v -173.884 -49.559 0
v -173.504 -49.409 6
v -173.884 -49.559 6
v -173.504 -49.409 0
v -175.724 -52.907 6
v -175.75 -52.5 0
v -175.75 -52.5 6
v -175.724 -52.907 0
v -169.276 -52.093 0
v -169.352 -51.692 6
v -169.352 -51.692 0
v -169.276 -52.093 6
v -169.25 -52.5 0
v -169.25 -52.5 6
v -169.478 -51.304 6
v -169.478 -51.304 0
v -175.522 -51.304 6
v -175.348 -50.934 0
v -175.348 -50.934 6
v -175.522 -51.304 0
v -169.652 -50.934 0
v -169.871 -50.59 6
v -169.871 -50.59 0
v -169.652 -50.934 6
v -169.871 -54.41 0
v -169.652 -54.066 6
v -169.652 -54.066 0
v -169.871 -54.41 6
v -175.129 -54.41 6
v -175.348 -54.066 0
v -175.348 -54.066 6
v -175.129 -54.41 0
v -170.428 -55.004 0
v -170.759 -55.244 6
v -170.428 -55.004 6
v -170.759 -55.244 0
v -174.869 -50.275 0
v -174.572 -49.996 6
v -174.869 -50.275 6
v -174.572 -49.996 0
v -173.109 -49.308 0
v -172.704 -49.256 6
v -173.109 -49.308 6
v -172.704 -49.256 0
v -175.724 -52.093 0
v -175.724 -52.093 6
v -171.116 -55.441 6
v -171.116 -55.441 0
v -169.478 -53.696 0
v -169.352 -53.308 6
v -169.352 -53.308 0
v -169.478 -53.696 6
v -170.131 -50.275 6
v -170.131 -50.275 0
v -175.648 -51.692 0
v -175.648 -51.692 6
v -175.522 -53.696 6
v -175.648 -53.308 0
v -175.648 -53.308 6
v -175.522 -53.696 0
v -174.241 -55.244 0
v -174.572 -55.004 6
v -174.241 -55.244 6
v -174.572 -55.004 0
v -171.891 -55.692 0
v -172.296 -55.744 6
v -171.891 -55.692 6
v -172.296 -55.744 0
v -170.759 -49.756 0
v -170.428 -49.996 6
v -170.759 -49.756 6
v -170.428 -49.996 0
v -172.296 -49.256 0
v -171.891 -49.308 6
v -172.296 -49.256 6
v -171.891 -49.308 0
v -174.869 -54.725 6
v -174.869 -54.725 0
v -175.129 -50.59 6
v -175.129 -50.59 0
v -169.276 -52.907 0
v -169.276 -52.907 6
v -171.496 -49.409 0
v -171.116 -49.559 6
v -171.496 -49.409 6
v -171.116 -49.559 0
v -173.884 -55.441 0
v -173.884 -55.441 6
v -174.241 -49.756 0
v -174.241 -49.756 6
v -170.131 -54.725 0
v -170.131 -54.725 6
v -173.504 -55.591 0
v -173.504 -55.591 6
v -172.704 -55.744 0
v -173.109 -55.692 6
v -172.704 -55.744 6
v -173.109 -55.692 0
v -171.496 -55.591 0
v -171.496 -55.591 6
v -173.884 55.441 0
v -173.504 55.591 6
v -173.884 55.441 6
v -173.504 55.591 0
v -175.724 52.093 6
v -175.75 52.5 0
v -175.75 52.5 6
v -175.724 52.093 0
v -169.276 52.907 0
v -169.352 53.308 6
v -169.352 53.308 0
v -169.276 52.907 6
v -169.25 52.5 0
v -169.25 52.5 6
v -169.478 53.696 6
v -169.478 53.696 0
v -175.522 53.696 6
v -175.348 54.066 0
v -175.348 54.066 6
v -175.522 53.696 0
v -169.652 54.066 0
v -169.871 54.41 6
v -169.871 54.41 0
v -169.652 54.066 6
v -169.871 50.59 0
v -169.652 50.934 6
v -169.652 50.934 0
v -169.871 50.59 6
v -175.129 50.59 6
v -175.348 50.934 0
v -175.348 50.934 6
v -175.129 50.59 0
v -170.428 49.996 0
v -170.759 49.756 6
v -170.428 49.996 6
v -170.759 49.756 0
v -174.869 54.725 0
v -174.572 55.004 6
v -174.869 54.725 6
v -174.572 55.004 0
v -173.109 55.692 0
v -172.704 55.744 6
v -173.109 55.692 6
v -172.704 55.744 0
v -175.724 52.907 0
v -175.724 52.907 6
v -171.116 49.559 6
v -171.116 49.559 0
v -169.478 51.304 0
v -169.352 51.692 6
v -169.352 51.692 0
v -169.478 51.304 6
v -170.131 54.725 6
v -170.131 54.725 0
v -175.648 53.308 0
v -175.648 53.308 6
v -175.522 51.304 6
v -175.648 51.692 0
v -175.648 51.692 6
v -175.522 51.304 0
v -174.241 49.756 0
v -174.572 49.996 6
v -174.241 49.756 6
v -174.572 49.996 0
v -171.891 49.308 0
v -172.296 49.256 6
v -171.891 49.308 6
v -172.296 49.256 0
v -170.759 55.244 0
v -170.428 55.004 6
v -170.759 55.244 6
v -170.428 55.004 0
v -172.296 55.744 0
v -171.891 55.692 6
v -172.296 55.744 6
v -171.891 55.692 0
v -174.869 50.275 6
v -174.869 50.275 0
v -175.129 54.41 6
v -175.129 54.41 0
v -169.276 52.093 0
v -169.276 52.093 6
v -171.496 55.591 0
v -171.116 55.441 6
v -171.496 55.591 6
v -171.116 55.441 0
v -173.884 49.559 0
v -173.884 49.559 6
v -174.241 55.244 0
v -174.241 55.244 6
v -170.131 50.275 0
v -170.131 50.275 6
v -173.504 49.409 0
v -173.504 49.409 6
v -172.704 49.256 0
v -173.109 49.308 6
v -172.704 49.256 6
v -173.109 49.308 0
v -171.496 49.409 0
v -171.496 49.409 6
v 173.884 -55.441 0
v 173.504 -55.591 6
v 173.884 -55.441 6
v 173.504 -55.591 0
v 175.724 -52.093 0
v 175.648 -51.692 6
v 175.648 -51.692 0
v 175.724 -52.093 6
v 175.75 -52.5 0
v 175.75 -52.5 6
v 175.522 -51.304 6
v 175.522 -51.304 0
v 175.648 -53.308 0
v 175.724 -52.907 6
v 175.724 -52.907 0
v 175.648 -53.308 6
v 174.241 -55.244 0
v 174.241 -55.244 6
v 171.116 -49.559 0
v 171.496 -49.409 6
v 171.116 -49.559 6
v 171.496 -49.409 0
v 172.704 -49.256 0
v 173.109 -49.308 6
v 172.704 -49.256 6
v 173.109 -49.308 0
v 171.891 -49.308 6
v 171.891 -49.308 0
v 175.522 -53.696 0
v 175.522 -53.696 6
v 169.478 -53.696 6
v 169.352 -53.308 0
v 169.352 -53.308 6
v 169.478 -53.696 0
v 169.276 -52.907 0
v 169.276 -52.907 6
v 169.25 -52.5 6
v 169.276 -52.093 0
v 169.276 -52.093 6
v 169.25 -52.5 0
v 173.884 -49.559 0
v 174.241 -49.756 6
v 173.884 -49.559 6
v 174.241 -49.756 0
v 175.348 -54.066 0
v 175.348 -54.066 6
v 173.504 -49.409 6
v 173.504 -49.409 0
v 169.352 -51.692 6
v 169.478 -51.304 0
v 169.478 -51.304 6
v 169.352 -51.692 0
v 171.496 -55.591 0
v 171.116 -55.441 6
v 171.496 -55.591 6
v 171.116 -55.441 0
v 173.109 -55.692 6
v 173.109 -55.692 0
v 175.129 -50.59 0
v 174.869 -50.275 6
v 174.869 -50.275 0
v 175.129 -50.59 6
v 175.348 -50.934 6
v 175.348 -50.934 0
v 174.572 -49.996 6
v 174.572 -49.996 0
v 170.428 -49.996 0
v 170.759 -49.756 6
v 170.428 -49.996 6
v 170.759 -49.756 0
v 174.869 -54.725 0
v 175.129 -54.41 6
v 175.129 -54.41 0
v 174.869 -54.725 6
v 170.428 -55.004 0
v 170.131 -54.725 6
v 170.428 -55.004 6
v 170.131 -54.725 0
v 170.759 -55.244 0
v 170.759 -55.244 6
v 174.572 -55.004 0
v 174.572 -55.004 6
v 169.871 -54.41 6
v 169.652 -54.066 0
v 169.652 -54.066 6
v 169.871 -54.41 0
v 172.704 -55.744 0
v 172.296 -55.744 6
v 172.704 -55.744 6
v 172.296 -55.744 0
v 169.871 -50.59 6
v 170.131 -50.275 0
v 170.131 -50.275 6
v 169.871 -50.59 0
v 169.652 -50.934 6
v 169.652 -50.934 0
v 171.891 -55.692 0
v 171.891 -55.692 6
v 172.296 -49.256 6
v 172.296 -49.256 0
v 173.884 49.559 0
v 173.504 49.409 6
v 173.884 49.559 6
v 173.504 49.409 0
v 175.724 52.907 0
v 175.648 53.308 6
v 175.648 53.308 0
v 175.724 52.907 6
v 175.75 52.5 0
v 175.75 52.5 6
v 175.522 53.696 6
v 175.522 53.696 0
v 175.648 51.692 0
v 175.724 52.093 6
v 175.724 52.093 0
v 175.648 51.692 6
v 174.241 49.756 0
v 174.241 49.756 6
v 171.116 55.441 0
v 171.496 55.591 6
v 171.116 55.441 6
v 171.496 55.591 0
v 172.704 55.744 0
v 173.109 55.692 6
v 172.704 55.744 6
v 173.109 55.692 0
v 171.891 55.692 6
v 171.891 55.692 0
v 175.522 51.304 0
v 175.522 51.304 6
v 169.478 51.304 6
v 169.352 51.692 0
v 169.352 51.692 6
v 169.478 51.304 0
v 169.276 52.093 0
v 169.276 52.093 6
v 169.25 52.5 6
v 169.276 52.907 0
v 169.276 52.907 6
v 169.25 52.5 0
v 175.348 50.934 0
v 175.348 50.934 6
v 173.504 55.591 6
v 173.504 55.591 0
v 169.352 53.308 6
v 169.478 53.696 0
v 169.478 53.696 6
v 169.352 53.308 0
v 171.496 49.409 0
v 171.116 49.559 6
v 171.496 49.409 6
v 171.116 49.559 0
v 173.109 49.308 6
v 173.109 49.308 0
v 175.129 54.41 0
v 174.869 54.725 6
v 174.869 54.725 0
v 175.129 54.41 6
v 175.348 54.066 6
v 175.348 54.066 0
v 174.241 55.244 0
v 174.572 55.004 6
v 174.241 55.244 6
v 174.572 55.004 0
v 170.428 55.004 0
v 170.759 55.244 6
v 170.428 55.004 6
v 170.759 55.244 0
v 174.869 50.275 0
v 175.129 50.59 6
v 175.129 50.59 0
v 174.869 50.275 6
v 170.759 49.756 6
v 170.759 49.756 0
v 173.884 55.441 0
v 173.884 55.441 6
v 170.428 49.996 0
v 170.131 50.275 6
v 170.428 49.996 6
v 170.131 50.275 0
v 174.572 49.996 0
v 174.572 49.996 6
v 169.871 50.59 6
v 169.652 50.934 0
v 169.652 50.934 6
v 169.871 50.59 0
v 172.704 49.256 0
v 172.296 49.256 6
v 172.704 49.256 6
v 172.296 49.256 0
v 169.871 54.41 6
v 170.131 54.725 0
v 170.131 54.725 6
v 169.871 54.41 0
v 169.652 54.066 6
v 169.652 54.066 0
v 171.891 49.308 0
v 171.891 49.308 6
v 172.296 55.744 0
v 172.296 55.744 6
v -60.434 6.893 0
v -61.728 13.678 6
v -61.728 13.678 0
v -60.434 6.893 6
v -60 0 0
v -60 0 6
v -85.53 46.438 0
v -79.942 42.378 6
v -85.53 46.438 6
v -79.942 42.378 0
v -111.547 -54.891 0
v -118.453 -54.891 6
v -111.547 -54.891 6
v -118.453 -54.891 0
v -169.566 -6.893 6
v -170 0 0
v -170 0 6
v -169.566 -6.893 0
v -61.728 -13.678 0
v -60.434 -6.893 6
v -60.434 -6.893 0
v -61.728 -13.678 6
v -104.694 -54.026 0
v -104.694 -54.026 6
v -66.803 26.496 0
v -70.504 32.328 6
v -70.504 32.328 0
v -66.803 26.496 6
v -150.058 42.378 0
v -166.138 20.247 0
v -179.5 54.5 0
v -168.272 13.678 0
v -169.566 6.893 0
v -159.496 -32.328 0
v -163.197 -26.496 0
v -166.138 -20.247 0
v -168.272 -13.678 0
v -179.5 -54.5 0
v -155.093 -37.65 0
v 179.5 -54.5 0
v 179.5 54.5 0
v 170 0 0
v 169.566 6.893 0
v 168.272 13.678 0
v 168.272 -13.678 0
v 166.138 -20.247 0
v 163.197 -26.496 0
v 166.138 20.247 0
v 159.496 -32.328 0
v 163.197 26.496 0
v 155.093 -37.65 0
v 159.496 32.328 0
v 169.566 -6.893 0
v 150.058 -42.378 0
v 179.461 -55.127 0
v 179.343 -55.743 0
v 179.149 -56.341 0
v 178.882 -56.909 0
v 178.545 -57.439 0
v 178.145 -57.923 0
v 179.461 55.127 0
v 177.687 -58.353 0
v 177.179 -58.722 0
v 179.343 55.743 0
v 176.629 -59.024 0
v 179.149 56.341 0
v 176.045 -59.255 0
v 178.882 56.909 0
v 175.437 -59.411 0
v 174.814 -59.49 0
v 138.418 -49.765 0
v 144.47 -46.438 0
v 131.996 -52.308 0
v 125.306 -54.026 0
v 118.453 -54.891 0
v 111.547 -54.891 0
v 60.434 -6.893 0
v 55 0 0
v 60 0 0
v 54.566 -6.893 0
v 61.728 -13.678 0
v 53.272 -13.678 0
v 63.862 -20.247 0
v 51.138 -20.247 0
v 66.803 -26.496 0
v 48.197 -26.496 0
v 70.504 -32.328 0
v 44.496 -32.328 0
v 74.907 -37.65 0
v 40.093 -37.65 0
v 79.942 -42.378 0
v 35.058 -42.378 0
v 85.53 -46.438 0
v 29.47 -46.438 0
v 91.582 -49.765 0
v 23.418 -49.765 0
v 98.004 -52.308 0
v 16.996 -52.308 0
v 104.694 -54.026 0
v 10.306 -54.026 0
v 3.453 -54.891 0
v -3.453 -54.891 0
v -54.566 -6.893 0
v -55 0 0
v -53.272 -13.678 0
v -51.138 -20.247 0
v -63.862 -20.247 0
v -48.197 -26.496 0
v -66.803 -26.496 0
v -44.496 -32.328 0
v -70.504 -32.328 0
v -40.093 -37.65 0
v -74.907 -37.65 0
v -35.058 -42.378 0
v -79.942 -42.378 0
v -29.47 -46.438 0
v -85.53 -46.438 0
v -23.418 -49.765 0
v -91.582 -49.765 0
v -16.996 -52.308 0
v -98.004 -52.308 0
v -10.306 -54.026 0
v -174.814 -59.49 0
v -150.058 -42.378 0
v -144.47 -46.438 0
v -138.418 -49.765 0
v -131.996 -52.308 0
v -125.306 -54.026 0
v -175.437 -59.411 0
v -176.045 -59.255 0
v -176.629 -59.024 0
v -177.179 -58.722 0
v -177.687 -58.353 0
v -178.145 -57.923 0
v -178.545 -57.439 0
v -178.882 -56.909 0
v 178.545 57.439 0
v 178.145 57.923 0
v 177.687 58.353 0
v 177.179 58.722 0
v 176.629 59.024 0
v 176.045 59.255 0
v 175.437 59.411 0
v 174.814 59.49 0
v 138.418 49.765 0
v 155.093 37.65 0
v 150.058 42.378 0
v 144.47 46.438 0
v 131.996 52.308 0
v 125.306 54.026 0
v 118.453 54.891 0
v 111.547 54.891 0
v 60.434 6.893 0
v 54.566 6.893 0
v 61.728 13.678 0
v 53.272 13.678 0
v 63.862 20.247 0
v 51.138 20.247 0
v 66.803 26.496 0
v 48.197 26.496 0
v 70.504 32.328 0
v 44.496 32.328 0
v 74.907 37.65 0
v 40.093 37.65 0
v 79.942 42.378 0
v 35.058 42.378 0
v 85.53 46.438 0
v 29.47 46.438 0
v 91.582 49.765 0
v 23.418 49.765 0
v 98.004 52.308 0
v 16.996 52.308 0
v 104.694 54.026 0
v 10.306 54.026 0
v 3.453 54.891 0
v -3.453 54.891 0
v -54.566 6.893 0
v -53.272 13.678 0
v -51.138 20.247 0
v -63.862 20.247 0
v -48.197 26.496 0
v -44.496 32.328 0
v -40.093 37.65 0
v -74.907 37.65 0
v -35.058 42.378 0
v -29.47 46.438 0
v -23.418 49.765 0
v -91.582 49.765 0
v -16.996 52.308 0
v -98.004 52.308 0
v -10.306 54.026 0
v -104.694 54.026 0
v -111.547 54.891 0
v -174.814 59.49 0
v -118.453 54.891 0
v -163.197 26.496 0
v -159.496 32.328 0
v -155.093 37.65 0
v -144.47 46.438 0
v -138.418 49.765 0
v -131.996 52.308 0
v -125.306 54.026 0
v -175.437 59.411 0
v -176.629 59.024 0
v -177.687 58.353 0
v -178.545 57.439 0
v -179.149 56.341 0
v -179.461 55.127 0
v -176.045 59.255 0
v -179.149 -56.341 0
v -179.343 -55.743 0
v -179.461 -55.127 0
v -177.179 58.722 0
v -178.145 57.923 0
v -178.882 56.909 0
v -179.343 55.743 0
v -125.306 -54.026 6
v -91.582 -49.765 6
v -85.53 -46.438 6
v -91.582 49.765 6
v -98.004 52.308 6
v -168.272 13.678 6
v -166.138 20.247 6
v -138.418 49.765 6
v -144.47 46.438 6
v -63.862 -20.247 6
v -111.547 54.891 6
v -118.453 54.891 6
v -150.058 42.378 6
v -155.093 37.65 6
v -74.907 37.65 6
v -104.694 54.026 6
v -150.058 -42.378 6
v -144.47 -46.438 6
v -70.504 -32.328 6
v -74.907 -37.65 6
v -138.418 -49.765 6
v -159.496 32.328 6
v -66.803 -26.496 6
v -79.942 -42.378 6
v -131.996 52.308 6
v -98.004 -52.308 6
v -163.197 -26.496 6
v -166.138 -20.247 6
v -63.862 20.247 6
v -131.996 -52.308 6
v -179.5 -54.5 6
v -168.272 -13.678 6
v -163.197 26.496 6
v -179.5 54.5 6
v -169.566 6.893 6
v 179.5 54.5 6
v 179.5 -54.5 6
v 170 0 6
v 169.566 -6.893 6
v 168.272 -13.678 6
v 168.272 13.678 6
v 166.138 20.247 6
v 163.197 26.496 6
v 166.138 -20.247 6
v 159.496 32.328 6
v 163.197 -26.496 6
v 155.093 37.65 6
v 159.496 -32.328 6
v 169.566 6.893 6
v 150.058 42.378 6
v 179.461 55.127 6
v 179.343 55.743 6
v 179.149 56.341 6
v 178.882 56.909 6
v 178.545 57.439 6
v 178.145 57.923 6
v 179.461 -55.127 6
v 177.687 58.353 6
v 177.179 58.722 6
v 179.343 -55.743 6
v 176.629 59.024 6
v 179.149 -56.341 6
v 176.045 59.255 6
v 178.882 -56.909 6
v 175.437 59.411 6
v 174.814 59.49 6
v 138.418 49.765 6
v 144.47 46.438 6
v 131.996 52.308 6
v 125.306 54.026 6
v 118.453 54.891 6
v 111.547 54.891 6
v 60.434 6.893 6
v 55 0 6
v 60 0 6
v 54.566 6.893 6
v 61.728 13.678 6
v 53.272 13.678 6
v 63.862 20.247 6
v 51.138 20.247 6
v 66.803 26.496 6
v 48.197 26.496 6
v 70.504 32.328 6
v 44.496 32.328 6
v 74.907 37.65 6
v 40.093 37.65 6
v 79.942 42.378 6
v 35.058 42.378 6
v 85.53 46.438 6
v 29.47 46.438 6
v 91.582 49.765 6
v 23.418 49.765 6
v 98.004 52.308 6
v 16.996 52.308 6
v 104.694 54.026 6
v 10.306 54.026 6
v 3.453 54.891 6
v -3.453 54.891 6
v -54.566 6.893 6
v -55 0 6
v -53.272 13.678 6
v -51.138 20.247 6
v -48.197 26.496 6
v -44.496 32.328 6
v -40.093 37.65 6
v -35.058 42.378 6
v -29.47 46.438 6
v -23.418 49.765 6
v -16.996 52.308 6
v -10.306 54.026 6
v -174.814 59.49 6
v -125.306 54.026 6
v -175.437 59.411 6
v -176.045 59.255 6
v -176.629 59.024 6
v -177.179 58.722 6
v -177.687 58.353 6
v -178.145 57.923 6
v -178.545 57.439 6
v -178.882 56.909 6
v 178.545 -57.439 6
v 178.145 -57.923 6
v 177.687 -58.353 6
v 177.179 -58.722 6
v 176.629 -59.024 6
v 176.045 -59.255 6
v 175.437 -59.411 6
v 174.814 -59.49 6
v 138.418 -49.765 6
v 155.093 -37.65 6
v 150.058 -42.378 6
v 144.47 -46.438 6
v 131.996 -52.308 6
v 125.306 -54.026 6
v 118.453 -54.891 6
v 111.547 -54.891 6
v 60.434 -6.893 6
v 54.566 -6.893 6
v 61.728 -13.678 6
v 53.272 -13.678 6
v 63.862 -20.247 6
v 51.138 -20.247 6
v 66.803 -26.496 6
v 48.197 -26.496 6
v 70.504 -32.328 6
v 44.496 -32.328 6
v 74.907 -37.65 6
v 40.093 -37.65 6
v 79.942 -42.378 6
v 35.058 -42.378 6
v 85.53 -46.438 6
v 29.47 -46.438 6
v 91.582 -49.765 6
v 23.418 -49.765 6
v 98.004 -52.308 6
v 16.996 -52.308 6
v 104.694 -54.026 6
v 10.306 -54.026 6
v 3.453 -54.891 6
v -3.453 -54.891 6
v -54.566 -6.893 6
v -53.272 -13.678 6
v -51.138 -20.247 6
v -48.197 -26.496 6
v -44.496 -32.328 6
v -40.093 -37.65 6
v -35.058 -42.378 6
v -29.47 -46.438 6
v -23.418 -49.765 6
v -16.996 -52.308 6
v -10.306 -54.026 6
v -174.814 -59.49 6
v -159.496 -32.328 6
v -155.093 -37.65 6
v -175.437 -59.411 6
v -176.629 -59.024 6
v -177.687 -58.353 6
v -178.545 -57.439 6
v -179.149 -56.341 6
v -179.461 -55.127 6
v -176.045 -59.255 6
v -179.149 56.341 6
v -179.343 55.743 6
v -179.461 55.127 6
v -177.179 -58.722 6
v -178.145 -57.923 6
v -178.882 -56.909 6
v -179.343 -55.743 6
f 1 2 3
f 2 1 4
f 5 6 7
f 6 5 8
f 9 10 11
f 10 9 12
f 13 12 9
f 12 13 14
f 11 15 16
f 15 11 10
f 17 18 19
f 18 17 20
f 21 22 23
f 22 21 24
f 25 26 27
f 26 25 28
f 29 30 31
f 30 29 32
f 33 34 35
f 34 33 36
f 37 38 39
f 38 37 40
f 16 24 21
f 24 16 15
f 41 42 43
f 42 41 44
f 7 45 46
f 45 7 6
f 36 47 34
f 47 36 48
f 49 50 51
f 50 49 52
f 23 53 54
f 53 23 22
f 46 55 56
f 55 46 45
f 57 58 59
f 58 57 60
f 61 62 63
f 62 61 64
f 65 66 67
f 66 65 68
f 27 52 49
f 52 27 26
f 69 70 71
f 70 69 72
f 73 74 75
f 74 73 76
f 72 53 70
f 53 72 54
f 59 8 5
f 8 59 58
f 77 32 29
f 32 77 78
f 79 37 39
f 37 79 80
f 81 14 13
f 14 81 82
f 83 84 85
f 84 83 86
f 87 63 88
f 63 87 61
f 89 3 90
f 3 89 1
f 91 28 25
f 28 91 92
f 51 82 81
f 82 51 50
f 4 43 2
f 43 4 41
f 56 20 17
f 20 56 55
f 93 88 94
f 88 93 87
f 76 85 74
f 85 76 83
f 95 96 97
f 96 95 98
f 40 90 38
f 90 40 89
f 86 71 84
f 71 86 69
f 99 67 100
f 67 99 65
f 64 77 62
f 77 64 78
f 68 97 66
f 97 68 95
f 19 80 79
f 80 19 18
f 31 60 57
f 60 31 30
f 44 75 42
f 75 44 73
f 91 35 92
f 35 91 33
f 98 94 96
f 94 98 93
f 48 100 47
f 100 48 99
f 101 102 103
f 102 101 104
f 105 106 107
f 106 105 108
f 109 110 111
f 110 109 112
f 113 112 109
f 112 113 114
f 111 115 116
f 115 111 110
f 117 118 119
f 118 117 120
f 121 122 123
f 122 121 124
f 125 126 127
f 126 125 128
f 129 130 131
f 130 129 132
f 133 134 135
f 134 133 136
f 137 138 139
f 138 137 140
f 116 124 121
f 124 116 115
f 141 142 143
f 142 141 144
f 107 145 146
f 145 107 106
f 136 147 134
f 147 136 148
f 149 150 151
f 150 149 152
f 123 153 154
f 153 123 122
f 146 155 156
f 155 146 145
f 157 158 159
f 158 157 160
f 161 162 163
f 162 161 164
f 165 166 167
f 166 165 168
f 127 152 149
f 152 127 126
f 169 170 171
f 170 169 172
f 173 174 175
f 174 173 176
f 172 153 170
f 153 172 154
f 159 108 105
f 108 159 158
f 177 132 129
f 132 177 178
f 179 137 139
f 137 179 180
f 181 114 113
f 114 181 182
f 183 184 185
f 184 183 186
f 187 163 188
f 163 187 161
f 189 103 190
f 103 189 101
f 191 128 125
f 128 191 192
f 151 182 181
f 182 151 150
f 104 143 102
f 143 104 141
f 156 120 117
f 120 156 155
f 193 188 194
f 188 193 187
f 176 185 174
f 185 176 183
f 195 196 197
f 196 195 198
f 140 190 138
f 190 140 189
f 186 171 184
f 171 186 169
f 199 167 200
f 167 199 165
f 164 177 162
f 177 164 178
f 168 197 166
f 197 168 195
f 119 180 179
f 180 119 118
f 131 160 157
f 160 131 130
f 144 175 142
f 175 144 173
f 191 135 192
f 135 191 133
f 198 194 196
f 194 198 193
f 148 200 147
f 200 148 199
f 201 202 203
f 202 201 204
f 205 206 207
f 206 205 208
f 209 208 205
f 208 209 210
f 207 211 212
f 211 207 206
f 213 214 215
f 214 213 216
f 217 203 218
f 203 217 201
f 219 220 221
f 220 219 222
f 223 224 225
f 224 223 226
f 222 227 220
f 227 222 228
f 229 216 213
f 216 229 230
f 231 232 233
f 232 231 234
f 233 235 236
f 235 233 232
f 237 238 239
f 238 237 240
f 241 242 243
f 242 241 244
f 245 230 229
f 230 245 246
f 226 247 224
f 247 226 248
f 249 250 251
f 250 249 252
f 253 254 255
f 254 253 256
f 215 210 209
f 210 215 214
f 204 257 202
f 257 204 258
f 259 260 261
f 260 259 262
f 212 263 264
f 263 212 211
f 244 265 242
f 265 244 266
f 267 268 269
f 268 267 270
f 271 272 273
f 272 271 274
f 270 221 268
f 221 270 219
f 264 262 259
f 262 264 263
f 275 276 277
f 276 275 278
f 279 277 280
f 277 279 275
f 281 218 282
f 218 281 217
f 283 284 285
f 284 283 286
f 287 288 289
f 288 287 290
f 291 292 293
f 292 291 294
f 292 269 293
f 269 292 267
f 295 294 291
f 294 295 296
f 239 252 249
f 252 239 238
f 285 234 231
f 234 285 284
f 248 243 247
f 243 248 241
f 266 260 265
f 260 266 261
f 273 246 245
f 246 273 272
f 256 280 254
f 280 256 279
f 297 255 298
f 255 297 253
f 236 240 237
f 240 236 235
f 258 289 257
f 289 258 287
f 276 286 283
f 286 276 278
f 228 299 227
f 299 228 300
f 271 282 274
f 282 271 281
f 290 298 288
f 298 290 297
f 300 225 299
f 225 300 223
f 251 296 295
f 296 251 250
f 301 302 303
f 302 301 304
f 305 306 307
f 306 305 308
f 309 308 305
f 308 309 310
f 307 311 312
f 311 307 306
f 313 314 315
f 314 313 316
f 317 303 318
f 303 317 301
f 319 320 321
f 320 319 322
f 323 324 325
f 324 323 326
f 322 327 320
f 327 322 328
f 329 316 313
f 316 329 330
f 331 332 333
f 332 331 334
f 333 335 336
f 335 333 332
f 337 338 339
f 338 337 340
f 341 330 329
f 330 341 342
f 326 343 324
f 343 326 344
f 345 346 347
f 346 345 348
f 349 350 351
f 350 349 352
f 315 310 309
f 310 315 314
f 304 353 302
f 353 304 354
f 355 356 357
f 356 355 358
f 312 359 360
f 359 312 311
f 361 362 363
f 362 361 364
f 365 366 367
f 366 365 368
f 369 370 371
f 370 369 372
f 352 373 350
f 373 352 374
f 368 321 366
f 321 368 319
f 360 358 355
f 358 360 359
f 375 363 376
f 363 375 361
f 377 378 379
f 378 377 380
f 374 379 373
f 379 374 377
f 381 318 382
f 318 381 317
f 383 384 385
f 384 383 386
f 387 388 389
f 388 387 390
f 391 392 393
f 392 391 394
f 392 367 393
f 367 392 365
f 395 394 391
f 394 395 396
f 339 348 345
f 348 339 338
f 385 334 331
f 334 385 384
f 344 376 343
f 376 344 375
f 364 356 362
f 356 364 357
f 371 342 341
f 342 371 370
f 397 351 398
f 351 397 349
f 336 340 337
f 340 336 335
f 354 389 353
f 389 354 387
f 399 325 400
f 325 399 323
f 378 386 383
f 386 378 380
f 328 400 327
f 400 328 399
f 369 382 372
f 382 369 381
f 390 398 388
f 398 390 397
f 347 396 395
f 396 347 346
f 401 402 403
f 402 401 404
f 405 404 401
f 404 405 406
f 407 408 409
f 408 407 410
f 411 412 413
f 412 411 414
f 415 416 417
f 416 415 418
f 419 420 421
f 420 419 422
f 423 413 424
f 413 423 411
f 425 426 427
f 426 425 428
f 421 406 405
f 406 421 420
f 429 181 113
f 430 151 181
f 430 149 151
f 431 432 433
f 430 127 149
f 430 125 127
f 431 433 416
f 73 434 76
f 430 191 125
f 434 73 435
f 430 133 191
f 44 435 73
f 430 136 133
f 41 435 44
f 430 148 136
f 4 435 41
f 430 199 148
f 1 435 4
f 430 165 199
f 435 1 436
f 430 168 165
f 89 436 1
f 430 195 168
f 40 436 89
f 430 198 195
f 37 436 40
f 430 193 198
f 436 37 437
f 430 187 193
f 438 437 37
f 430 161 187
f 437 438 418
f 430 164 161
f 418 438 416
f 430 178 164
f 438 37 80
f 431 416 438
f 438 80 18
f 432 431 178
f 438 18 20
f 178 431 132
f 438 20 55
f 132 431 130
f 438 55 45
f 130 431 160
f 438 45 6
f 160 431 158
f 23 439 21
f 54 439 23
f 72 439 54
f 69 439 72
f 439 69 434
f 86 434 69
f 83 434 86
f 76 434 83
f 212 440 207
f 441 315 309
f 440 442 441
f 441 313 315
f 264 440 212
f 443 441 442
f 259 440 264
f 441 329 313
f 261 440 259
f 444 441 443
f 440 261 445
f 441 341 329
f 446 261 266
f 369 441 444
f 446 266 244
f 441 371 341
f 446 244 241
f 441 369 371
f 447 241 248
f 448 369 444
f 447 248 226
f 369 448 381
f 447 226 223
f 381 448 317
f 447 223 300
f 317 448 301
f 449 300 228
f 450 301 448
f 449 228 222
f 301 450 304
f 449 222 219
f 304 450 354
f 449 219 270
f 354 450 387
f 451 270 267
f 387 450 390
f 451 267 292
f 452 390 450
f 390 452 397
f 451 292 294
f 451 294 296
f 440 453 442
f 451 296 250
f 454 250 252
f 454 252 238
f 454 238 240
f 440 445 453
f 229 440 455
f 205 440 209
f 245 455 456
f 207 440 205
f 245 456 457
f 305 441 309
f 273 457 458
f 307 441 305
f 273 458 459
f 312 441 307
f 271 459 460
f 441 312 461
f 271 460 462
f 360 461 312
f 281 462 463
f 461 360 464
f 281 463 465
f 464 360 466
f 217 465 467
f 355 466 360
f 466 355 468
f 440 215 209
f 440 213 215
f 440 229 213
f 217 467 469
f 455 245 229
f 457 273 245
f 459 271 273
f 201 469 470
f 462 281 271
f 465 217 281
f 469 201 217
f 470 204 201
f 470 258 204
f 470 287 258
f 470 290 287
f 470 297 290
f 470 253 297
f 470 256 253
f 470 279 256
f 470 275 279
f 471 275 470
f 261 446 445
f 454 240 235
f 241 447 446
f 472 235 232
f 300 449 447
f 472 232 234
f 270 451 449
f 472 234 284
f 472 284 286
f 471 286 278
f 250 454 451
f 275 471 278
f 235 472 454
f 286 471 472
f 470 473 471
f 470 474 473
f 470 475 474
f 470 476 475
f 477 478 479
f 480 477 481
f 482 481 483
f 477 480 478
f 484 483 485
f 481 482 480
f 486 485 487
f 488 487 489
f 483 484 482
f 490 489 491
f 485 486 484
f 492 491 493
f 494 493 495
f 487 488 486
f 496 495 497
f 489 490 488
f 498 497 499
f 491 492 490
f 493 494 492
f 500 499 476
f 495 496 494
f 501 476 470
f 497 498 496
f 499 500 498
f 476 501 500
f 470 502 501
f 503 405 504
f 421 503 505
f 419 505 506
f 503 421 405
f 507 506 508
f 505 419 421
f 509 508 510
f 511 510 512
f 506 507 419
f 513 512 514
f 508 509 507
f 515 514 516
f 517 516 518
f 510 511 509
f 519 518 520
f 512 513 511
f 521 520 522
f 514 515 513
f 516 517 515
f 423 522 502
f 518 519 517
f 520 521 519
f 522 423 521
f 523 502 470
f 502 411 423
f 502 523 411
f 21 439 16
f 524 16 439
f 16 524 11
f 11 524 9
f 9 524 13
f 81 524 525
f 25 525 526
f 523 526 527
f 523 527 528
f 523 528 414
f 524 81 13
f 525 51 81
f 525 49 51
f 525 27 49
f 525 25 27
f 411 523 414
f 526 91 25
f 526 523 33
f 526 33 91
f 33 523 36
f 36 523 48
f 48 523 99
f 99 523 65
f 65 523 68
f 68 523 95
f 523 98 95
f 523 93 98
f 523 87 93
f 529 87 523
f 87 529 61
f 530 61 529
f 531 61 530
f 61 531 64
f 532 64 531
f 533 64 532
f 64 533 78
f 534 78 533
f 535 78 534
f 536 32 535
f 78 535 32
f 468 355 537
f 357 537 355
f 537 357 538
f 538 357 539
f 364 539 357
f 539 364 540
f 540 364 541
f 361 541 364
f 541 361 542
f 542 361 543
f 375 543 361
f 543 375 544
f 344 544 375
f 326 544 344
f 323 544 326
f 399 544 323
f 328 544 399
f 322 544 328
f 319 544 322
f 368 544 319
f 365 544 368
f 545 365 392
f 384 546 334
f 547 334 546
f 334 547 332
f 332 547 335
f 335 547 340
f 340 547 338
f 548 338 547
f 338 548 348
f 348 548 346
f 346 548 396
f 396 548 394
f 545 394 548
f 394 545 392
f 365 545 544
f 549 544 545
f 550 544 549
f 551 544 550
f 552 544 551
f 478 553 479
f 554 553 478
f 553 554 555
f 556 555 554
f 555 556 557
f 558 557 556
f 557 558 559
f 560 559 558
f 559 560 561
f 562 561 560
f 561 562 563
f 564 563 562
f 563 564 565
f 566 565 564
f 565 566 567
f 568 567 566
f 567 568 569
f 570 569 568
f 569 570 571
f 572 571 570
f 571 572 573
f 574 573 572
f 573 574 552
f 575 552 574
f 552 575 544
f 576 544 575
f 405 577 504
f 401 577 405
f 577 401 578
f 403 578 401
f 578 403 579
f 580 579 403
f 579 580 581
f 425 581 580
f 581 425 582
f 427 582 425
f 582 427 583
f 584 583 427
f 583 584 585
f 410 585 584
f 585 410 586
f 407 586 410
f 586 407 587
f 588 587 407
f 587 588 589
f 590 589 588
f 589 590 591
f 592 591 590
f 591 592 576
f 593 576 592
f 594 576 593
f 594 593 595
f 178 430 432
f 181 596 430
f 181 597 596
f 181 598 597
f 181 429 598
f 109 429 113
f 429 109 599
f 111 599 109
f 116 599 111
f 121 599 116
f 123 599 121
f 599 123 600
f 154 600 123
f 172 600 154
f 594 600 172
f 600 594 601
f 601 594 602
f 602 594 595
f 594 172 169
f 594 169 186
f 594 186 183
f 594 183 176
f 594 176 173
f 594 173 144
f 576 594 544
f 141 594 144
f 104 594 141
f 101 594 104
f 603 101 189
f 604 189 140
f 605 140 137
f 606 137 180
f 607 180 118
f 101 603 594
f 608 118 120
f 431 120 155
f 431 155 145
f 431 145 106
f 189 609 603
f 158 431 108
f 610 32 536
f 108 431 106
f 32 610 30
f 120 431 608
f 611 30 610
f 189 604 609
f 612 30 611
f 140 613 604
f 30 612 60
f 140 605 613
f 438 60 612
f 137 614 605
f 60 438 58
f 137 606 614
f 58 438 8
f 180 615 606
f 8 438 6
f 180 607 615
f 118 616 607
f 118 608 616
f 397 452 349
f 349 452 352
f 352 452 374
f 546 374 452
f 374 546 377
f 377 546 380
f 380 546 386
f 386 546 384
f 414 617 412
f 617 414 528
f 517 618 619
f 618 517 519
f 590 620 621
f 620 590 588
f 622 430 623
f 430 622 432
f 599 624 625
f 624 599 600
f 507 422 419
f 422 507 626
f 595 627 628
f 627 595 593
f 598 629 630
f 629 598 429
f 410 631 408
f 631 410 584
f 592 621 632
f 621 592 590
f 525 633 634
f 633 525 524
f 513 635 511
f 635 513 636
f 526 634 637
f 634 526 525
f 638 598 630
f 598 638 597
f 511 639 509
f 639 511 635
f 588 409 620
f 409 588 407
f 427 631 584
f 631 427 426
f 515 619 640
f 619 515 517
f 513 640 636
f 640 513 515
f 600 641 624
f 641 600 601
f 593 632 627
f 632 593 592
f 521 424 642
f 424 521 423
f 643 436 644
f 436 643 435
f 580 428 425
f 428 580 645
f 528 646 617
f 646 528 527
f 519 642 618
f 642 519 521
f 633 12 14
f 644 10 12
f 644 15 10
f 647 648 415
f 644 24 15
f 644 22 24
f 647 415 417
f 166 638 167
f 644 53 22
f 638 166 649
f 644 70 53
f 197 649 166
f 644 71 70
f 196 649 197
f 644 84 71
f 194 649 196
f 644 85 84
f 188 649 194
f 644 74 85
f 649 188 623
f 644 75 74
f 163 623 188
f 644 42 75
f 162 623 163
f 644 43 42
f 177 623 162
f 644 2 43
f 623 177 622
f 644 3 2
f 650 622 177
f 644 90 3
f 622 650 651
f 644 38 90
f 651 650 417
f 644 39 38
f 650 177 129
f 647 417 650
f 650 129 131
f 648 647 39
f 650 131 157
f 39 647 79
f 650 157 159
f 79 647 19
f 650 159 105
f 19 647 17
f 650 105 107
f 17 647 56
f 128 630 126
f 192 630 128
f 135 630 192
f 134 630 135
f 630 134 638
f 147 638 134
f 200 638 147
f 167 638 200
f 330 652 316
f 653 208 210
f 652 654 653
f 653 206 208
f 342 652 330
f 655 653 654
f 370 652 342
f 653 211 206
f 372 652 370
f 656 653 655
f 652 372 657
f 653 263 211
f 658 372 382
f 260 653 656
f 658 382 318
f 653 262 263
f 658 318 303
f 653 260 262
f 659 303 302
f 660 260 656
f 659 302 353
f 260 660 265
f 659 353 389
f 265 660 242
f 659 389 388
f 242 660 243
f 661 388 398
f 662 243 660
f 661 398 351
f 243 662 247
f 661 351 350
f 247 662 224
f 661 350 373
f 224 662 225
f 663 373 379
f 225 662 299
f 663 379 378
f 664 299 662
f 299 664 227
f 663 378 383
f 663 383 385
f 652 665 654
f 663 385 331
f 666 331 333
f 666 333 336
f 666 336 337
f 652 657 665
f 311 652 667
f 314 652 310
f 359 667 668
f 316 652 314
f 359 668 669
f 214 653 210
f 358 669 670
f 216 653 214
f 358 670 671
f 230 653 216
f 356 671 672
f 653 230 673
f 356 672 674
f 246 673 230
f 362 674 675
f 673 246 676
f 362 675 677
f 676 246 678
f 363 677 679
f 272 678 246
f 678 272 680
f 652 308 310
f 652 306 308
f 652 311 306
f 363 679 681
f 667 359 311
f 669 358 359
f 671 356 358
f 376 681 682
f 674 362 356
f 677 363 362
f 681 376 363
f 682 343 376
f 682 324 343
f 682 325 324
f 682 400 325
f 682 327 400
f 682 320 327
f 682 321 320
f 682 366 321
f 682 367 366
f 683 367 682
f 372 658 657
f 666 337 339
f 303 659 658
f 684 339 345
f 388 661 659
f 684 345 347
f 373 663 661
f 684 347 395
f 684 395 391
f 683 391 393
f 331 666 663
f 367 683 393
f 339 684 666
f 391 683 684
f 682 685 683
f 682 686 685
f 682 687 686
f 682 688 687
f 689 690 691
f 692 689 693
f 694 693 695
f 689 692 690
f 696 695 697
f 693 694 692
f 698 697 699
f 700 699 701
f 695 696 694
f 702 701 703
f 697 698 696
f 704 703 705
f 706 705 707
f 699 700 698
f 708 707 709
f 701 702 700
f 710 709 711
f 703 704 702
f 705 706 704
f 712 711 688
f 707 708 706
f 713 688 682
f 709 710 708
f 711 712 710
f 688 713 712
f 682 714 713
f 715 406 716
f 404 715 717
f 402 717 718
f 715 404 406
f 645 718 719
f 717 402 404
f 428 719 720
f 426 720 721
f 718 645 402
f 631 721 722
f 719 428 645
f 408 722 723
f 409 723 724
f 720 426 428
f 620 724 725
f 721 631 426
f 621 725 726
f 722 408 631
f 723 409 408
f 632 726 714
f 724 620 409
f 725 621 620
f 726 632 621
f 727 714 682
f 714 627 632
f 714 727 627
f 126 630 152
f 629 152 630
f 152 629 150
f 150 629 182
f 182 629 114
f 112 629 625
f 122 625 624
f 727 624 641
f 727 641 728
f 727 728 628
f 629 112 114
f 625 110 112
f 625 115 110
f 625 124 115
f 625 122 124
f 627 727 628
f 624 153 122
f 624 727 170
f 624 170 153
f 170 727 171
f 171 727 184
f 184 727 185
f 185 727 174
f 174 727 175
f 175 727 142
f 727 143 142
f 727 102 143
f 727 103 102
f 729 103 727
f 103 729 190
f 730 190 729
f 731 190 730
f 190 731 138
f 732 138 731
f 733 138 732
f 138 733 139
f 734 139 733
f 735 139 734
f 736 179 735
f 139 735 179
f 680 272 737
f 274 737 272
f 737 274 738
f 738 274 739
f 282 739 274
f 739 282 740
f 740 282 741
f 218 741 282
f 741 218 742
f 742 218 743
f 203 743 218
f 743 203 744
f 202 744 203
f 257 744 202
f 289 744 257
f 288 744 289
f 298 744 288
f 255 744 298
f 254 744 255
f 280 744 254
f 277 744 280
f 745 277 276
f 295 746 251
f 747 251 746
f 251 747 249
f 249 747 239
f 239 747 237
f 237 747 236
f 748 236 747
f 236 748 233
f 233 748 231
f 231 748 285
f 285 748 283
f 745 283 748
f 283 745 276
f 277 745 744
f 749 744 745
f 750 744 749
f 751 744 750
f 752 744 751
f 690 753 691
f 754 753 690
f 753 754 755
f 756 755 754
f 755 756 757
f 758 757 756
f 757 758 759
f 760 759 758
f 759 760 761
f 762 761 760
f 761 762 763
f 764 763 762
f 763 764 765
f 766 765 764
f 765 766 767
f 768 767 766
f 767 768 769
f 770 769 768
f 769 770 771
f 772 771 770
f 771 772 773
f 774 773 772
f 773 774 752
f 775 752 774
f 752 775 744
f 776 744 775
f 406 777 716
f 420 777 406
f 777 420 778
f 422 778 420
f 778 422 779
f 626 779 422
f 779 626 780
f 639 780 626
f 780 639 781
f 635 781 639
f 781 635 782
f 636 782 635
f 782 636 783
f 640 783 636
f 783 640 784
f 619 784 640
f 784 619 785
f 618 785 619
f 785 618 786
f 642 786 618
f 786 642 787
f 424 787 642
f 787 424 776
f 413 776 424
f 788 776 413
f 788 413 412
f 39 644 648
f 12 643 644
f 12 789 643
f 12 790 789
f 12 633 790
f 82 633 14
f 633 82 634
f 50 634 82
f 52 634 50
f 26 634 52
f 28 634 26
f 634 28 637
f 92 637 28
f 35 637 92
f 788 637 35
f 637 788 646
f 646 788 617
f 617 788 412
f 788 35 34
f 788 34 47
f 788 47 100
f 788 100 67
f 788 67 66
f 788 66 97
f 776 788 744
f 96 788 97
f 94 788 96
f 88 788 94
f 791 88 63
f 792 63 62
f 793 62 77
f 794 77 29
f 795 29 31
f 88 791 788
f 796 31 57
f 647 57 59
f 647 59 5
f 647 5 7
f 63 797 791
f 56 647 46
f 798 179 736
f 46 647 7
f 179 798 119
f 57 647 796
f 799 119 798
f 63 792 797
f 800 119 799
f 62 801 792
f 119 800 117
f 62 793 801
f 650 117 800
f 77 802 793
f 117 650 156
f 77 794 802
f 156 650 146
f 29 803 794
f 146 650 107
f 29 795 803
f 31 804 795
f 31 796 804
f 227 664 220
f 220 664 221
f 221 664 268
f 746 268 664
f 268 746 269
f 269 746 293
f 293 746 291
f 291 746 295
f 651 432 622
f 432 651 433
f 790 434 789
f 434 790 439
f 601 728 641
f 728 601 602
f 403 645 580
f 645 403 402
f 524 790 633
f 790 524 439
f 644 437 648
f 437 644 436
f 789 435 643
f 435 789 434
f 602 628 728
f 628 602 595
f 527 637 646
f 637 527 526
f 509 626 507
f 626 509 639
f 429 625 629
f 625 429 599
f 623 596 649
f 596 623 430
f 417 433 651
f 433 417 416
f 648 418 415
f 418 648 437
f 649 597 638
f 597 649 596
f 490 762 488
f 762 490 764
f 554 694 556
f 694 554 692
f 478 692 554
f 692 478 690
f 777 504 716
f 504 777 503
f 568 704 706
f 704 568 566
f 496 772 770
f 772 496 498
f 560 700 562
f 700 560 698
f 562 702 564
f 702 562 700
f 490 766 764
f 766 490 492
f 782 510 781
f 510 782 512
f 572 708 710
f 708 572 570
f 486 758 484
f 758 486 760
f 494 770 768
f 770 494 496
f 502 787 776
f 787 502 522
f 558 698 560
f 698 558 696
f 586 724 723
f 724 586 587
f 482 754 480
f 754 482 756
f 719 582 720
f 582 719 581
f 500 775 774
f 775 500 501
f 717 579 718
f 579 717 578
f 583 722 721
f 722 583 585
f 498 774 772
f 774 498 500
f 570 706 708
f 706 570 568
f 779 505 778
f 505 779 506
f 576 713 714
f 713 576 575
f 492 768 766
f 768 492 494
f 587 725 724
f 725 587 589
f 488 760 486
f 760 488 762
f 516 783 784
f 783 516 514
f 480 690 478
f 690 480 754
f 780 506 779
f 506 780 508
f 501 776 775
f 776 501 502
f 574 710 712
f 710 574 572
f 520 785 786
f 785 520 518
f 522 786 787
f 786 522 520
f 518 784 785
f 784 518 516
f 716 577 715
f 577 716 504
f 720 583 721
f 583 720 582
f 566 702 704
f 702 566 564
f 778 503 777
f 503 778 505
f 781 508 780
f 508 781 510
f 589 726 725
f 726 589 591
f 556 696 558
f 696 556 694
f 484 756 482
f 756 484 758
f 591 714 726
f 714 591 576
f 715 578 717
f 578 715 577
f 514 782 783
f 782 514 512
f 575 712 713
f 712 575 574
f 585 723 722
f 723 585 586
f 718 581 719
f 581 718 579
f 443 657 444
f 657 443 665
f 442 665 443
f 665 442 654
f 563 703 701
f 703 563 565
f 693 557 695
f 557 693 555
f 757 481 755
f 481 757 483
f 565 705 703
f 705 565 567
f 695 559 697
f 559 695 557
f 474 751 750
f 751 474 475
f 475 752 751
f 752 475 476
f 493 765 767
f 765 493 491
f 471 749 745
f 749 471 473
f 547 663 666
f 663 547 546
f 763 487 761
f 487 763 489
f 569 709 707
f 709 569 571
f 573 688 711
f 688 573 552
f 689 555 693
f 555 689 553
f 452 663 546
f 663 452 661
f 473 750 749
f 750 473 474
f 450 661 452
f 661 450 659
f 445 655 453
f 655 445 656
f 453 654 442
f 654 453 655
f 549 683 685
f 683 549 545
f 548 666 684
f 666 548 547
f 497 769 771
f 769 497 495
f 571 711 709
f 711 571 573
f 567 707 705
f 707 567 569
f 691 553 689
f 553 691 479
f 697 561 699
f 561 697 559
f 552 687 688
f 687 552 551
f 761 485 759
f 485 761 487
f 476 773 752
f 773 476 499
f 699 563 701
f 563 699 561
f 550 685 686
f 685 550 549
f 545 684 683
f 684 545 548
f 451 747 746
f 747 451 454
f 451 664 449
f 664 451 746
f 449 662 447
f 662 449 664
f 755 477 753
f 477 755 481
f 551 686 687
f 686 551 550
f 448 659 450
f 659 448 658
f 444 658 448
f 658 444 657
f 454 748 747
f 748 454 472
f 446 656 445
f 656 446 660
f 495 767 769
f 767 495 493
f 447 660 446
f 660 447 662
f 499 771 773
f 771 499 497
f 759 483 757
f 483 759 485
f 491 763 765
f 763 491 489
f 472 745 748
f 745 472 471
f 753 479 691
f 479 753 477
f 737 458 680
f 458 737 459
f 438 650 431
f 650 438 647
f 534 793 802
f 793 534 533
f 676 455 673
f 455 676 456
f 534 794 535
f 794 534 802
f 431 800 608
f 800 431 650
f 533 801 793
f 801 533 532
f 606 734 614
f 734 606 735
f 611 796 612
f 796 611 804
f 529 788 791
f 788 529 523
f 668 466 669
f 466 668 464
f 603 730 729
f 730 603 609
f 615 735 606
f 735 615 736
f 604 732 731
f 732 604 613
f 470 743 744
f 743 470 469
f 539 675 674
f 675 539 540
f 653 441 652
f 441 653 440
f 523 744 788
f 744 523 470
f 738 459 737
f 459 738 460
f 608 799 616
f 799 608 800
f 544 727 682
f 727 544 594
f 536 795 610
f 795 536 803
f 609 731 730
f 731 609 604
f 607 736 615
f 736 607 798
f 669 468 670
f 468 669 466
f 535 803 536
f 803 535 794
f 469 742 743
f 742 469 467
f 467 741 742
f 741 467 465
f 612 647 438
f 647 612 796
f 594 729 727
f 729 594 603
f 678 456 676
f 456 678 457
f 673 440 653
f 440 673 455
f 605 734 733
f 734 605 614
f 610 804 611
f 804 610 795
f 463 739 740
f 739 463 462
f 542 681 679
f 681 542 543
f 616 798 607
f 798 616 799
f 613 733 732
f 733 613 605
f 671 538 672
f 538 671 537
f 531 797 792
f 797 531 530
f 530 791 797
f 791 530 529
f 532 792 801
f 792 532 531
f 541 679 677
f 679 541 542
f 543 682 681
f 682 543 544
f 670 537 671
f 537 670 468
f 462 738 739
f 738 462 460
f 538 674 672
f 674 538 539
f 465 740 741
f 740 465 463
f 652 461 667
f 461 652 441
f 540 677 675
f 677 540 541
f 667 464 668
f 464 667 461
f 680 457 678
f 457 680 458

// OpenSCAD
$fn = 50;


difference() {
	union() {
		hull() {
			translate(v = [-174.5000000000, 54.5000000000, 0]) {
				cylinder(h = 6, r = 5);
			}
			translate(v = [174.5000000000, 54.5000000000, 0]) {
				cylinder(h = 6, r = 5);
			}
			translate(v = [-174.5000000000, -54.5000000000, 0]) {
				cylinder(h = 6, r = 5);
			}
			translate(v = [174.5000000000, -54.5000000000, 0]) {
				cylinder(h = 6, r = 5);
			}
		}
	}
	union() {
		#translate(v = [-172.5000000000, -52.5000000000, -100.0000000000]) {
			cylinder(h = 200, r = 3.2500000000);
		}
		#translate(v = [-172.5000000000, 52.5000000000, -100.0000000000]) {
			cylinder(h = 200, r = 3.2500000000);
		}
		#translate(v = [172.5000000000, -52.5000000000, -100.0000000000]) {
			cylinder(h = 200, r = 3.2500000000);
		}
		#translate(v = [172.5000000000, 52.5000000000, -100.0000000000]) {
			cylinder(h = 200, r = 3.2500000000);
		}
		#translate(v = [-115.0000000000, 0, 0]) {
			cylinder(h = 6, r = 55.0000000000);
		}
		#cylinder(h = 6, r = 55.0000000000);
		#translate(v = [115.0000000000, 0, 0]) {
			cylinder(h = 6, r = 55.0000000000);
		}
	}
}
